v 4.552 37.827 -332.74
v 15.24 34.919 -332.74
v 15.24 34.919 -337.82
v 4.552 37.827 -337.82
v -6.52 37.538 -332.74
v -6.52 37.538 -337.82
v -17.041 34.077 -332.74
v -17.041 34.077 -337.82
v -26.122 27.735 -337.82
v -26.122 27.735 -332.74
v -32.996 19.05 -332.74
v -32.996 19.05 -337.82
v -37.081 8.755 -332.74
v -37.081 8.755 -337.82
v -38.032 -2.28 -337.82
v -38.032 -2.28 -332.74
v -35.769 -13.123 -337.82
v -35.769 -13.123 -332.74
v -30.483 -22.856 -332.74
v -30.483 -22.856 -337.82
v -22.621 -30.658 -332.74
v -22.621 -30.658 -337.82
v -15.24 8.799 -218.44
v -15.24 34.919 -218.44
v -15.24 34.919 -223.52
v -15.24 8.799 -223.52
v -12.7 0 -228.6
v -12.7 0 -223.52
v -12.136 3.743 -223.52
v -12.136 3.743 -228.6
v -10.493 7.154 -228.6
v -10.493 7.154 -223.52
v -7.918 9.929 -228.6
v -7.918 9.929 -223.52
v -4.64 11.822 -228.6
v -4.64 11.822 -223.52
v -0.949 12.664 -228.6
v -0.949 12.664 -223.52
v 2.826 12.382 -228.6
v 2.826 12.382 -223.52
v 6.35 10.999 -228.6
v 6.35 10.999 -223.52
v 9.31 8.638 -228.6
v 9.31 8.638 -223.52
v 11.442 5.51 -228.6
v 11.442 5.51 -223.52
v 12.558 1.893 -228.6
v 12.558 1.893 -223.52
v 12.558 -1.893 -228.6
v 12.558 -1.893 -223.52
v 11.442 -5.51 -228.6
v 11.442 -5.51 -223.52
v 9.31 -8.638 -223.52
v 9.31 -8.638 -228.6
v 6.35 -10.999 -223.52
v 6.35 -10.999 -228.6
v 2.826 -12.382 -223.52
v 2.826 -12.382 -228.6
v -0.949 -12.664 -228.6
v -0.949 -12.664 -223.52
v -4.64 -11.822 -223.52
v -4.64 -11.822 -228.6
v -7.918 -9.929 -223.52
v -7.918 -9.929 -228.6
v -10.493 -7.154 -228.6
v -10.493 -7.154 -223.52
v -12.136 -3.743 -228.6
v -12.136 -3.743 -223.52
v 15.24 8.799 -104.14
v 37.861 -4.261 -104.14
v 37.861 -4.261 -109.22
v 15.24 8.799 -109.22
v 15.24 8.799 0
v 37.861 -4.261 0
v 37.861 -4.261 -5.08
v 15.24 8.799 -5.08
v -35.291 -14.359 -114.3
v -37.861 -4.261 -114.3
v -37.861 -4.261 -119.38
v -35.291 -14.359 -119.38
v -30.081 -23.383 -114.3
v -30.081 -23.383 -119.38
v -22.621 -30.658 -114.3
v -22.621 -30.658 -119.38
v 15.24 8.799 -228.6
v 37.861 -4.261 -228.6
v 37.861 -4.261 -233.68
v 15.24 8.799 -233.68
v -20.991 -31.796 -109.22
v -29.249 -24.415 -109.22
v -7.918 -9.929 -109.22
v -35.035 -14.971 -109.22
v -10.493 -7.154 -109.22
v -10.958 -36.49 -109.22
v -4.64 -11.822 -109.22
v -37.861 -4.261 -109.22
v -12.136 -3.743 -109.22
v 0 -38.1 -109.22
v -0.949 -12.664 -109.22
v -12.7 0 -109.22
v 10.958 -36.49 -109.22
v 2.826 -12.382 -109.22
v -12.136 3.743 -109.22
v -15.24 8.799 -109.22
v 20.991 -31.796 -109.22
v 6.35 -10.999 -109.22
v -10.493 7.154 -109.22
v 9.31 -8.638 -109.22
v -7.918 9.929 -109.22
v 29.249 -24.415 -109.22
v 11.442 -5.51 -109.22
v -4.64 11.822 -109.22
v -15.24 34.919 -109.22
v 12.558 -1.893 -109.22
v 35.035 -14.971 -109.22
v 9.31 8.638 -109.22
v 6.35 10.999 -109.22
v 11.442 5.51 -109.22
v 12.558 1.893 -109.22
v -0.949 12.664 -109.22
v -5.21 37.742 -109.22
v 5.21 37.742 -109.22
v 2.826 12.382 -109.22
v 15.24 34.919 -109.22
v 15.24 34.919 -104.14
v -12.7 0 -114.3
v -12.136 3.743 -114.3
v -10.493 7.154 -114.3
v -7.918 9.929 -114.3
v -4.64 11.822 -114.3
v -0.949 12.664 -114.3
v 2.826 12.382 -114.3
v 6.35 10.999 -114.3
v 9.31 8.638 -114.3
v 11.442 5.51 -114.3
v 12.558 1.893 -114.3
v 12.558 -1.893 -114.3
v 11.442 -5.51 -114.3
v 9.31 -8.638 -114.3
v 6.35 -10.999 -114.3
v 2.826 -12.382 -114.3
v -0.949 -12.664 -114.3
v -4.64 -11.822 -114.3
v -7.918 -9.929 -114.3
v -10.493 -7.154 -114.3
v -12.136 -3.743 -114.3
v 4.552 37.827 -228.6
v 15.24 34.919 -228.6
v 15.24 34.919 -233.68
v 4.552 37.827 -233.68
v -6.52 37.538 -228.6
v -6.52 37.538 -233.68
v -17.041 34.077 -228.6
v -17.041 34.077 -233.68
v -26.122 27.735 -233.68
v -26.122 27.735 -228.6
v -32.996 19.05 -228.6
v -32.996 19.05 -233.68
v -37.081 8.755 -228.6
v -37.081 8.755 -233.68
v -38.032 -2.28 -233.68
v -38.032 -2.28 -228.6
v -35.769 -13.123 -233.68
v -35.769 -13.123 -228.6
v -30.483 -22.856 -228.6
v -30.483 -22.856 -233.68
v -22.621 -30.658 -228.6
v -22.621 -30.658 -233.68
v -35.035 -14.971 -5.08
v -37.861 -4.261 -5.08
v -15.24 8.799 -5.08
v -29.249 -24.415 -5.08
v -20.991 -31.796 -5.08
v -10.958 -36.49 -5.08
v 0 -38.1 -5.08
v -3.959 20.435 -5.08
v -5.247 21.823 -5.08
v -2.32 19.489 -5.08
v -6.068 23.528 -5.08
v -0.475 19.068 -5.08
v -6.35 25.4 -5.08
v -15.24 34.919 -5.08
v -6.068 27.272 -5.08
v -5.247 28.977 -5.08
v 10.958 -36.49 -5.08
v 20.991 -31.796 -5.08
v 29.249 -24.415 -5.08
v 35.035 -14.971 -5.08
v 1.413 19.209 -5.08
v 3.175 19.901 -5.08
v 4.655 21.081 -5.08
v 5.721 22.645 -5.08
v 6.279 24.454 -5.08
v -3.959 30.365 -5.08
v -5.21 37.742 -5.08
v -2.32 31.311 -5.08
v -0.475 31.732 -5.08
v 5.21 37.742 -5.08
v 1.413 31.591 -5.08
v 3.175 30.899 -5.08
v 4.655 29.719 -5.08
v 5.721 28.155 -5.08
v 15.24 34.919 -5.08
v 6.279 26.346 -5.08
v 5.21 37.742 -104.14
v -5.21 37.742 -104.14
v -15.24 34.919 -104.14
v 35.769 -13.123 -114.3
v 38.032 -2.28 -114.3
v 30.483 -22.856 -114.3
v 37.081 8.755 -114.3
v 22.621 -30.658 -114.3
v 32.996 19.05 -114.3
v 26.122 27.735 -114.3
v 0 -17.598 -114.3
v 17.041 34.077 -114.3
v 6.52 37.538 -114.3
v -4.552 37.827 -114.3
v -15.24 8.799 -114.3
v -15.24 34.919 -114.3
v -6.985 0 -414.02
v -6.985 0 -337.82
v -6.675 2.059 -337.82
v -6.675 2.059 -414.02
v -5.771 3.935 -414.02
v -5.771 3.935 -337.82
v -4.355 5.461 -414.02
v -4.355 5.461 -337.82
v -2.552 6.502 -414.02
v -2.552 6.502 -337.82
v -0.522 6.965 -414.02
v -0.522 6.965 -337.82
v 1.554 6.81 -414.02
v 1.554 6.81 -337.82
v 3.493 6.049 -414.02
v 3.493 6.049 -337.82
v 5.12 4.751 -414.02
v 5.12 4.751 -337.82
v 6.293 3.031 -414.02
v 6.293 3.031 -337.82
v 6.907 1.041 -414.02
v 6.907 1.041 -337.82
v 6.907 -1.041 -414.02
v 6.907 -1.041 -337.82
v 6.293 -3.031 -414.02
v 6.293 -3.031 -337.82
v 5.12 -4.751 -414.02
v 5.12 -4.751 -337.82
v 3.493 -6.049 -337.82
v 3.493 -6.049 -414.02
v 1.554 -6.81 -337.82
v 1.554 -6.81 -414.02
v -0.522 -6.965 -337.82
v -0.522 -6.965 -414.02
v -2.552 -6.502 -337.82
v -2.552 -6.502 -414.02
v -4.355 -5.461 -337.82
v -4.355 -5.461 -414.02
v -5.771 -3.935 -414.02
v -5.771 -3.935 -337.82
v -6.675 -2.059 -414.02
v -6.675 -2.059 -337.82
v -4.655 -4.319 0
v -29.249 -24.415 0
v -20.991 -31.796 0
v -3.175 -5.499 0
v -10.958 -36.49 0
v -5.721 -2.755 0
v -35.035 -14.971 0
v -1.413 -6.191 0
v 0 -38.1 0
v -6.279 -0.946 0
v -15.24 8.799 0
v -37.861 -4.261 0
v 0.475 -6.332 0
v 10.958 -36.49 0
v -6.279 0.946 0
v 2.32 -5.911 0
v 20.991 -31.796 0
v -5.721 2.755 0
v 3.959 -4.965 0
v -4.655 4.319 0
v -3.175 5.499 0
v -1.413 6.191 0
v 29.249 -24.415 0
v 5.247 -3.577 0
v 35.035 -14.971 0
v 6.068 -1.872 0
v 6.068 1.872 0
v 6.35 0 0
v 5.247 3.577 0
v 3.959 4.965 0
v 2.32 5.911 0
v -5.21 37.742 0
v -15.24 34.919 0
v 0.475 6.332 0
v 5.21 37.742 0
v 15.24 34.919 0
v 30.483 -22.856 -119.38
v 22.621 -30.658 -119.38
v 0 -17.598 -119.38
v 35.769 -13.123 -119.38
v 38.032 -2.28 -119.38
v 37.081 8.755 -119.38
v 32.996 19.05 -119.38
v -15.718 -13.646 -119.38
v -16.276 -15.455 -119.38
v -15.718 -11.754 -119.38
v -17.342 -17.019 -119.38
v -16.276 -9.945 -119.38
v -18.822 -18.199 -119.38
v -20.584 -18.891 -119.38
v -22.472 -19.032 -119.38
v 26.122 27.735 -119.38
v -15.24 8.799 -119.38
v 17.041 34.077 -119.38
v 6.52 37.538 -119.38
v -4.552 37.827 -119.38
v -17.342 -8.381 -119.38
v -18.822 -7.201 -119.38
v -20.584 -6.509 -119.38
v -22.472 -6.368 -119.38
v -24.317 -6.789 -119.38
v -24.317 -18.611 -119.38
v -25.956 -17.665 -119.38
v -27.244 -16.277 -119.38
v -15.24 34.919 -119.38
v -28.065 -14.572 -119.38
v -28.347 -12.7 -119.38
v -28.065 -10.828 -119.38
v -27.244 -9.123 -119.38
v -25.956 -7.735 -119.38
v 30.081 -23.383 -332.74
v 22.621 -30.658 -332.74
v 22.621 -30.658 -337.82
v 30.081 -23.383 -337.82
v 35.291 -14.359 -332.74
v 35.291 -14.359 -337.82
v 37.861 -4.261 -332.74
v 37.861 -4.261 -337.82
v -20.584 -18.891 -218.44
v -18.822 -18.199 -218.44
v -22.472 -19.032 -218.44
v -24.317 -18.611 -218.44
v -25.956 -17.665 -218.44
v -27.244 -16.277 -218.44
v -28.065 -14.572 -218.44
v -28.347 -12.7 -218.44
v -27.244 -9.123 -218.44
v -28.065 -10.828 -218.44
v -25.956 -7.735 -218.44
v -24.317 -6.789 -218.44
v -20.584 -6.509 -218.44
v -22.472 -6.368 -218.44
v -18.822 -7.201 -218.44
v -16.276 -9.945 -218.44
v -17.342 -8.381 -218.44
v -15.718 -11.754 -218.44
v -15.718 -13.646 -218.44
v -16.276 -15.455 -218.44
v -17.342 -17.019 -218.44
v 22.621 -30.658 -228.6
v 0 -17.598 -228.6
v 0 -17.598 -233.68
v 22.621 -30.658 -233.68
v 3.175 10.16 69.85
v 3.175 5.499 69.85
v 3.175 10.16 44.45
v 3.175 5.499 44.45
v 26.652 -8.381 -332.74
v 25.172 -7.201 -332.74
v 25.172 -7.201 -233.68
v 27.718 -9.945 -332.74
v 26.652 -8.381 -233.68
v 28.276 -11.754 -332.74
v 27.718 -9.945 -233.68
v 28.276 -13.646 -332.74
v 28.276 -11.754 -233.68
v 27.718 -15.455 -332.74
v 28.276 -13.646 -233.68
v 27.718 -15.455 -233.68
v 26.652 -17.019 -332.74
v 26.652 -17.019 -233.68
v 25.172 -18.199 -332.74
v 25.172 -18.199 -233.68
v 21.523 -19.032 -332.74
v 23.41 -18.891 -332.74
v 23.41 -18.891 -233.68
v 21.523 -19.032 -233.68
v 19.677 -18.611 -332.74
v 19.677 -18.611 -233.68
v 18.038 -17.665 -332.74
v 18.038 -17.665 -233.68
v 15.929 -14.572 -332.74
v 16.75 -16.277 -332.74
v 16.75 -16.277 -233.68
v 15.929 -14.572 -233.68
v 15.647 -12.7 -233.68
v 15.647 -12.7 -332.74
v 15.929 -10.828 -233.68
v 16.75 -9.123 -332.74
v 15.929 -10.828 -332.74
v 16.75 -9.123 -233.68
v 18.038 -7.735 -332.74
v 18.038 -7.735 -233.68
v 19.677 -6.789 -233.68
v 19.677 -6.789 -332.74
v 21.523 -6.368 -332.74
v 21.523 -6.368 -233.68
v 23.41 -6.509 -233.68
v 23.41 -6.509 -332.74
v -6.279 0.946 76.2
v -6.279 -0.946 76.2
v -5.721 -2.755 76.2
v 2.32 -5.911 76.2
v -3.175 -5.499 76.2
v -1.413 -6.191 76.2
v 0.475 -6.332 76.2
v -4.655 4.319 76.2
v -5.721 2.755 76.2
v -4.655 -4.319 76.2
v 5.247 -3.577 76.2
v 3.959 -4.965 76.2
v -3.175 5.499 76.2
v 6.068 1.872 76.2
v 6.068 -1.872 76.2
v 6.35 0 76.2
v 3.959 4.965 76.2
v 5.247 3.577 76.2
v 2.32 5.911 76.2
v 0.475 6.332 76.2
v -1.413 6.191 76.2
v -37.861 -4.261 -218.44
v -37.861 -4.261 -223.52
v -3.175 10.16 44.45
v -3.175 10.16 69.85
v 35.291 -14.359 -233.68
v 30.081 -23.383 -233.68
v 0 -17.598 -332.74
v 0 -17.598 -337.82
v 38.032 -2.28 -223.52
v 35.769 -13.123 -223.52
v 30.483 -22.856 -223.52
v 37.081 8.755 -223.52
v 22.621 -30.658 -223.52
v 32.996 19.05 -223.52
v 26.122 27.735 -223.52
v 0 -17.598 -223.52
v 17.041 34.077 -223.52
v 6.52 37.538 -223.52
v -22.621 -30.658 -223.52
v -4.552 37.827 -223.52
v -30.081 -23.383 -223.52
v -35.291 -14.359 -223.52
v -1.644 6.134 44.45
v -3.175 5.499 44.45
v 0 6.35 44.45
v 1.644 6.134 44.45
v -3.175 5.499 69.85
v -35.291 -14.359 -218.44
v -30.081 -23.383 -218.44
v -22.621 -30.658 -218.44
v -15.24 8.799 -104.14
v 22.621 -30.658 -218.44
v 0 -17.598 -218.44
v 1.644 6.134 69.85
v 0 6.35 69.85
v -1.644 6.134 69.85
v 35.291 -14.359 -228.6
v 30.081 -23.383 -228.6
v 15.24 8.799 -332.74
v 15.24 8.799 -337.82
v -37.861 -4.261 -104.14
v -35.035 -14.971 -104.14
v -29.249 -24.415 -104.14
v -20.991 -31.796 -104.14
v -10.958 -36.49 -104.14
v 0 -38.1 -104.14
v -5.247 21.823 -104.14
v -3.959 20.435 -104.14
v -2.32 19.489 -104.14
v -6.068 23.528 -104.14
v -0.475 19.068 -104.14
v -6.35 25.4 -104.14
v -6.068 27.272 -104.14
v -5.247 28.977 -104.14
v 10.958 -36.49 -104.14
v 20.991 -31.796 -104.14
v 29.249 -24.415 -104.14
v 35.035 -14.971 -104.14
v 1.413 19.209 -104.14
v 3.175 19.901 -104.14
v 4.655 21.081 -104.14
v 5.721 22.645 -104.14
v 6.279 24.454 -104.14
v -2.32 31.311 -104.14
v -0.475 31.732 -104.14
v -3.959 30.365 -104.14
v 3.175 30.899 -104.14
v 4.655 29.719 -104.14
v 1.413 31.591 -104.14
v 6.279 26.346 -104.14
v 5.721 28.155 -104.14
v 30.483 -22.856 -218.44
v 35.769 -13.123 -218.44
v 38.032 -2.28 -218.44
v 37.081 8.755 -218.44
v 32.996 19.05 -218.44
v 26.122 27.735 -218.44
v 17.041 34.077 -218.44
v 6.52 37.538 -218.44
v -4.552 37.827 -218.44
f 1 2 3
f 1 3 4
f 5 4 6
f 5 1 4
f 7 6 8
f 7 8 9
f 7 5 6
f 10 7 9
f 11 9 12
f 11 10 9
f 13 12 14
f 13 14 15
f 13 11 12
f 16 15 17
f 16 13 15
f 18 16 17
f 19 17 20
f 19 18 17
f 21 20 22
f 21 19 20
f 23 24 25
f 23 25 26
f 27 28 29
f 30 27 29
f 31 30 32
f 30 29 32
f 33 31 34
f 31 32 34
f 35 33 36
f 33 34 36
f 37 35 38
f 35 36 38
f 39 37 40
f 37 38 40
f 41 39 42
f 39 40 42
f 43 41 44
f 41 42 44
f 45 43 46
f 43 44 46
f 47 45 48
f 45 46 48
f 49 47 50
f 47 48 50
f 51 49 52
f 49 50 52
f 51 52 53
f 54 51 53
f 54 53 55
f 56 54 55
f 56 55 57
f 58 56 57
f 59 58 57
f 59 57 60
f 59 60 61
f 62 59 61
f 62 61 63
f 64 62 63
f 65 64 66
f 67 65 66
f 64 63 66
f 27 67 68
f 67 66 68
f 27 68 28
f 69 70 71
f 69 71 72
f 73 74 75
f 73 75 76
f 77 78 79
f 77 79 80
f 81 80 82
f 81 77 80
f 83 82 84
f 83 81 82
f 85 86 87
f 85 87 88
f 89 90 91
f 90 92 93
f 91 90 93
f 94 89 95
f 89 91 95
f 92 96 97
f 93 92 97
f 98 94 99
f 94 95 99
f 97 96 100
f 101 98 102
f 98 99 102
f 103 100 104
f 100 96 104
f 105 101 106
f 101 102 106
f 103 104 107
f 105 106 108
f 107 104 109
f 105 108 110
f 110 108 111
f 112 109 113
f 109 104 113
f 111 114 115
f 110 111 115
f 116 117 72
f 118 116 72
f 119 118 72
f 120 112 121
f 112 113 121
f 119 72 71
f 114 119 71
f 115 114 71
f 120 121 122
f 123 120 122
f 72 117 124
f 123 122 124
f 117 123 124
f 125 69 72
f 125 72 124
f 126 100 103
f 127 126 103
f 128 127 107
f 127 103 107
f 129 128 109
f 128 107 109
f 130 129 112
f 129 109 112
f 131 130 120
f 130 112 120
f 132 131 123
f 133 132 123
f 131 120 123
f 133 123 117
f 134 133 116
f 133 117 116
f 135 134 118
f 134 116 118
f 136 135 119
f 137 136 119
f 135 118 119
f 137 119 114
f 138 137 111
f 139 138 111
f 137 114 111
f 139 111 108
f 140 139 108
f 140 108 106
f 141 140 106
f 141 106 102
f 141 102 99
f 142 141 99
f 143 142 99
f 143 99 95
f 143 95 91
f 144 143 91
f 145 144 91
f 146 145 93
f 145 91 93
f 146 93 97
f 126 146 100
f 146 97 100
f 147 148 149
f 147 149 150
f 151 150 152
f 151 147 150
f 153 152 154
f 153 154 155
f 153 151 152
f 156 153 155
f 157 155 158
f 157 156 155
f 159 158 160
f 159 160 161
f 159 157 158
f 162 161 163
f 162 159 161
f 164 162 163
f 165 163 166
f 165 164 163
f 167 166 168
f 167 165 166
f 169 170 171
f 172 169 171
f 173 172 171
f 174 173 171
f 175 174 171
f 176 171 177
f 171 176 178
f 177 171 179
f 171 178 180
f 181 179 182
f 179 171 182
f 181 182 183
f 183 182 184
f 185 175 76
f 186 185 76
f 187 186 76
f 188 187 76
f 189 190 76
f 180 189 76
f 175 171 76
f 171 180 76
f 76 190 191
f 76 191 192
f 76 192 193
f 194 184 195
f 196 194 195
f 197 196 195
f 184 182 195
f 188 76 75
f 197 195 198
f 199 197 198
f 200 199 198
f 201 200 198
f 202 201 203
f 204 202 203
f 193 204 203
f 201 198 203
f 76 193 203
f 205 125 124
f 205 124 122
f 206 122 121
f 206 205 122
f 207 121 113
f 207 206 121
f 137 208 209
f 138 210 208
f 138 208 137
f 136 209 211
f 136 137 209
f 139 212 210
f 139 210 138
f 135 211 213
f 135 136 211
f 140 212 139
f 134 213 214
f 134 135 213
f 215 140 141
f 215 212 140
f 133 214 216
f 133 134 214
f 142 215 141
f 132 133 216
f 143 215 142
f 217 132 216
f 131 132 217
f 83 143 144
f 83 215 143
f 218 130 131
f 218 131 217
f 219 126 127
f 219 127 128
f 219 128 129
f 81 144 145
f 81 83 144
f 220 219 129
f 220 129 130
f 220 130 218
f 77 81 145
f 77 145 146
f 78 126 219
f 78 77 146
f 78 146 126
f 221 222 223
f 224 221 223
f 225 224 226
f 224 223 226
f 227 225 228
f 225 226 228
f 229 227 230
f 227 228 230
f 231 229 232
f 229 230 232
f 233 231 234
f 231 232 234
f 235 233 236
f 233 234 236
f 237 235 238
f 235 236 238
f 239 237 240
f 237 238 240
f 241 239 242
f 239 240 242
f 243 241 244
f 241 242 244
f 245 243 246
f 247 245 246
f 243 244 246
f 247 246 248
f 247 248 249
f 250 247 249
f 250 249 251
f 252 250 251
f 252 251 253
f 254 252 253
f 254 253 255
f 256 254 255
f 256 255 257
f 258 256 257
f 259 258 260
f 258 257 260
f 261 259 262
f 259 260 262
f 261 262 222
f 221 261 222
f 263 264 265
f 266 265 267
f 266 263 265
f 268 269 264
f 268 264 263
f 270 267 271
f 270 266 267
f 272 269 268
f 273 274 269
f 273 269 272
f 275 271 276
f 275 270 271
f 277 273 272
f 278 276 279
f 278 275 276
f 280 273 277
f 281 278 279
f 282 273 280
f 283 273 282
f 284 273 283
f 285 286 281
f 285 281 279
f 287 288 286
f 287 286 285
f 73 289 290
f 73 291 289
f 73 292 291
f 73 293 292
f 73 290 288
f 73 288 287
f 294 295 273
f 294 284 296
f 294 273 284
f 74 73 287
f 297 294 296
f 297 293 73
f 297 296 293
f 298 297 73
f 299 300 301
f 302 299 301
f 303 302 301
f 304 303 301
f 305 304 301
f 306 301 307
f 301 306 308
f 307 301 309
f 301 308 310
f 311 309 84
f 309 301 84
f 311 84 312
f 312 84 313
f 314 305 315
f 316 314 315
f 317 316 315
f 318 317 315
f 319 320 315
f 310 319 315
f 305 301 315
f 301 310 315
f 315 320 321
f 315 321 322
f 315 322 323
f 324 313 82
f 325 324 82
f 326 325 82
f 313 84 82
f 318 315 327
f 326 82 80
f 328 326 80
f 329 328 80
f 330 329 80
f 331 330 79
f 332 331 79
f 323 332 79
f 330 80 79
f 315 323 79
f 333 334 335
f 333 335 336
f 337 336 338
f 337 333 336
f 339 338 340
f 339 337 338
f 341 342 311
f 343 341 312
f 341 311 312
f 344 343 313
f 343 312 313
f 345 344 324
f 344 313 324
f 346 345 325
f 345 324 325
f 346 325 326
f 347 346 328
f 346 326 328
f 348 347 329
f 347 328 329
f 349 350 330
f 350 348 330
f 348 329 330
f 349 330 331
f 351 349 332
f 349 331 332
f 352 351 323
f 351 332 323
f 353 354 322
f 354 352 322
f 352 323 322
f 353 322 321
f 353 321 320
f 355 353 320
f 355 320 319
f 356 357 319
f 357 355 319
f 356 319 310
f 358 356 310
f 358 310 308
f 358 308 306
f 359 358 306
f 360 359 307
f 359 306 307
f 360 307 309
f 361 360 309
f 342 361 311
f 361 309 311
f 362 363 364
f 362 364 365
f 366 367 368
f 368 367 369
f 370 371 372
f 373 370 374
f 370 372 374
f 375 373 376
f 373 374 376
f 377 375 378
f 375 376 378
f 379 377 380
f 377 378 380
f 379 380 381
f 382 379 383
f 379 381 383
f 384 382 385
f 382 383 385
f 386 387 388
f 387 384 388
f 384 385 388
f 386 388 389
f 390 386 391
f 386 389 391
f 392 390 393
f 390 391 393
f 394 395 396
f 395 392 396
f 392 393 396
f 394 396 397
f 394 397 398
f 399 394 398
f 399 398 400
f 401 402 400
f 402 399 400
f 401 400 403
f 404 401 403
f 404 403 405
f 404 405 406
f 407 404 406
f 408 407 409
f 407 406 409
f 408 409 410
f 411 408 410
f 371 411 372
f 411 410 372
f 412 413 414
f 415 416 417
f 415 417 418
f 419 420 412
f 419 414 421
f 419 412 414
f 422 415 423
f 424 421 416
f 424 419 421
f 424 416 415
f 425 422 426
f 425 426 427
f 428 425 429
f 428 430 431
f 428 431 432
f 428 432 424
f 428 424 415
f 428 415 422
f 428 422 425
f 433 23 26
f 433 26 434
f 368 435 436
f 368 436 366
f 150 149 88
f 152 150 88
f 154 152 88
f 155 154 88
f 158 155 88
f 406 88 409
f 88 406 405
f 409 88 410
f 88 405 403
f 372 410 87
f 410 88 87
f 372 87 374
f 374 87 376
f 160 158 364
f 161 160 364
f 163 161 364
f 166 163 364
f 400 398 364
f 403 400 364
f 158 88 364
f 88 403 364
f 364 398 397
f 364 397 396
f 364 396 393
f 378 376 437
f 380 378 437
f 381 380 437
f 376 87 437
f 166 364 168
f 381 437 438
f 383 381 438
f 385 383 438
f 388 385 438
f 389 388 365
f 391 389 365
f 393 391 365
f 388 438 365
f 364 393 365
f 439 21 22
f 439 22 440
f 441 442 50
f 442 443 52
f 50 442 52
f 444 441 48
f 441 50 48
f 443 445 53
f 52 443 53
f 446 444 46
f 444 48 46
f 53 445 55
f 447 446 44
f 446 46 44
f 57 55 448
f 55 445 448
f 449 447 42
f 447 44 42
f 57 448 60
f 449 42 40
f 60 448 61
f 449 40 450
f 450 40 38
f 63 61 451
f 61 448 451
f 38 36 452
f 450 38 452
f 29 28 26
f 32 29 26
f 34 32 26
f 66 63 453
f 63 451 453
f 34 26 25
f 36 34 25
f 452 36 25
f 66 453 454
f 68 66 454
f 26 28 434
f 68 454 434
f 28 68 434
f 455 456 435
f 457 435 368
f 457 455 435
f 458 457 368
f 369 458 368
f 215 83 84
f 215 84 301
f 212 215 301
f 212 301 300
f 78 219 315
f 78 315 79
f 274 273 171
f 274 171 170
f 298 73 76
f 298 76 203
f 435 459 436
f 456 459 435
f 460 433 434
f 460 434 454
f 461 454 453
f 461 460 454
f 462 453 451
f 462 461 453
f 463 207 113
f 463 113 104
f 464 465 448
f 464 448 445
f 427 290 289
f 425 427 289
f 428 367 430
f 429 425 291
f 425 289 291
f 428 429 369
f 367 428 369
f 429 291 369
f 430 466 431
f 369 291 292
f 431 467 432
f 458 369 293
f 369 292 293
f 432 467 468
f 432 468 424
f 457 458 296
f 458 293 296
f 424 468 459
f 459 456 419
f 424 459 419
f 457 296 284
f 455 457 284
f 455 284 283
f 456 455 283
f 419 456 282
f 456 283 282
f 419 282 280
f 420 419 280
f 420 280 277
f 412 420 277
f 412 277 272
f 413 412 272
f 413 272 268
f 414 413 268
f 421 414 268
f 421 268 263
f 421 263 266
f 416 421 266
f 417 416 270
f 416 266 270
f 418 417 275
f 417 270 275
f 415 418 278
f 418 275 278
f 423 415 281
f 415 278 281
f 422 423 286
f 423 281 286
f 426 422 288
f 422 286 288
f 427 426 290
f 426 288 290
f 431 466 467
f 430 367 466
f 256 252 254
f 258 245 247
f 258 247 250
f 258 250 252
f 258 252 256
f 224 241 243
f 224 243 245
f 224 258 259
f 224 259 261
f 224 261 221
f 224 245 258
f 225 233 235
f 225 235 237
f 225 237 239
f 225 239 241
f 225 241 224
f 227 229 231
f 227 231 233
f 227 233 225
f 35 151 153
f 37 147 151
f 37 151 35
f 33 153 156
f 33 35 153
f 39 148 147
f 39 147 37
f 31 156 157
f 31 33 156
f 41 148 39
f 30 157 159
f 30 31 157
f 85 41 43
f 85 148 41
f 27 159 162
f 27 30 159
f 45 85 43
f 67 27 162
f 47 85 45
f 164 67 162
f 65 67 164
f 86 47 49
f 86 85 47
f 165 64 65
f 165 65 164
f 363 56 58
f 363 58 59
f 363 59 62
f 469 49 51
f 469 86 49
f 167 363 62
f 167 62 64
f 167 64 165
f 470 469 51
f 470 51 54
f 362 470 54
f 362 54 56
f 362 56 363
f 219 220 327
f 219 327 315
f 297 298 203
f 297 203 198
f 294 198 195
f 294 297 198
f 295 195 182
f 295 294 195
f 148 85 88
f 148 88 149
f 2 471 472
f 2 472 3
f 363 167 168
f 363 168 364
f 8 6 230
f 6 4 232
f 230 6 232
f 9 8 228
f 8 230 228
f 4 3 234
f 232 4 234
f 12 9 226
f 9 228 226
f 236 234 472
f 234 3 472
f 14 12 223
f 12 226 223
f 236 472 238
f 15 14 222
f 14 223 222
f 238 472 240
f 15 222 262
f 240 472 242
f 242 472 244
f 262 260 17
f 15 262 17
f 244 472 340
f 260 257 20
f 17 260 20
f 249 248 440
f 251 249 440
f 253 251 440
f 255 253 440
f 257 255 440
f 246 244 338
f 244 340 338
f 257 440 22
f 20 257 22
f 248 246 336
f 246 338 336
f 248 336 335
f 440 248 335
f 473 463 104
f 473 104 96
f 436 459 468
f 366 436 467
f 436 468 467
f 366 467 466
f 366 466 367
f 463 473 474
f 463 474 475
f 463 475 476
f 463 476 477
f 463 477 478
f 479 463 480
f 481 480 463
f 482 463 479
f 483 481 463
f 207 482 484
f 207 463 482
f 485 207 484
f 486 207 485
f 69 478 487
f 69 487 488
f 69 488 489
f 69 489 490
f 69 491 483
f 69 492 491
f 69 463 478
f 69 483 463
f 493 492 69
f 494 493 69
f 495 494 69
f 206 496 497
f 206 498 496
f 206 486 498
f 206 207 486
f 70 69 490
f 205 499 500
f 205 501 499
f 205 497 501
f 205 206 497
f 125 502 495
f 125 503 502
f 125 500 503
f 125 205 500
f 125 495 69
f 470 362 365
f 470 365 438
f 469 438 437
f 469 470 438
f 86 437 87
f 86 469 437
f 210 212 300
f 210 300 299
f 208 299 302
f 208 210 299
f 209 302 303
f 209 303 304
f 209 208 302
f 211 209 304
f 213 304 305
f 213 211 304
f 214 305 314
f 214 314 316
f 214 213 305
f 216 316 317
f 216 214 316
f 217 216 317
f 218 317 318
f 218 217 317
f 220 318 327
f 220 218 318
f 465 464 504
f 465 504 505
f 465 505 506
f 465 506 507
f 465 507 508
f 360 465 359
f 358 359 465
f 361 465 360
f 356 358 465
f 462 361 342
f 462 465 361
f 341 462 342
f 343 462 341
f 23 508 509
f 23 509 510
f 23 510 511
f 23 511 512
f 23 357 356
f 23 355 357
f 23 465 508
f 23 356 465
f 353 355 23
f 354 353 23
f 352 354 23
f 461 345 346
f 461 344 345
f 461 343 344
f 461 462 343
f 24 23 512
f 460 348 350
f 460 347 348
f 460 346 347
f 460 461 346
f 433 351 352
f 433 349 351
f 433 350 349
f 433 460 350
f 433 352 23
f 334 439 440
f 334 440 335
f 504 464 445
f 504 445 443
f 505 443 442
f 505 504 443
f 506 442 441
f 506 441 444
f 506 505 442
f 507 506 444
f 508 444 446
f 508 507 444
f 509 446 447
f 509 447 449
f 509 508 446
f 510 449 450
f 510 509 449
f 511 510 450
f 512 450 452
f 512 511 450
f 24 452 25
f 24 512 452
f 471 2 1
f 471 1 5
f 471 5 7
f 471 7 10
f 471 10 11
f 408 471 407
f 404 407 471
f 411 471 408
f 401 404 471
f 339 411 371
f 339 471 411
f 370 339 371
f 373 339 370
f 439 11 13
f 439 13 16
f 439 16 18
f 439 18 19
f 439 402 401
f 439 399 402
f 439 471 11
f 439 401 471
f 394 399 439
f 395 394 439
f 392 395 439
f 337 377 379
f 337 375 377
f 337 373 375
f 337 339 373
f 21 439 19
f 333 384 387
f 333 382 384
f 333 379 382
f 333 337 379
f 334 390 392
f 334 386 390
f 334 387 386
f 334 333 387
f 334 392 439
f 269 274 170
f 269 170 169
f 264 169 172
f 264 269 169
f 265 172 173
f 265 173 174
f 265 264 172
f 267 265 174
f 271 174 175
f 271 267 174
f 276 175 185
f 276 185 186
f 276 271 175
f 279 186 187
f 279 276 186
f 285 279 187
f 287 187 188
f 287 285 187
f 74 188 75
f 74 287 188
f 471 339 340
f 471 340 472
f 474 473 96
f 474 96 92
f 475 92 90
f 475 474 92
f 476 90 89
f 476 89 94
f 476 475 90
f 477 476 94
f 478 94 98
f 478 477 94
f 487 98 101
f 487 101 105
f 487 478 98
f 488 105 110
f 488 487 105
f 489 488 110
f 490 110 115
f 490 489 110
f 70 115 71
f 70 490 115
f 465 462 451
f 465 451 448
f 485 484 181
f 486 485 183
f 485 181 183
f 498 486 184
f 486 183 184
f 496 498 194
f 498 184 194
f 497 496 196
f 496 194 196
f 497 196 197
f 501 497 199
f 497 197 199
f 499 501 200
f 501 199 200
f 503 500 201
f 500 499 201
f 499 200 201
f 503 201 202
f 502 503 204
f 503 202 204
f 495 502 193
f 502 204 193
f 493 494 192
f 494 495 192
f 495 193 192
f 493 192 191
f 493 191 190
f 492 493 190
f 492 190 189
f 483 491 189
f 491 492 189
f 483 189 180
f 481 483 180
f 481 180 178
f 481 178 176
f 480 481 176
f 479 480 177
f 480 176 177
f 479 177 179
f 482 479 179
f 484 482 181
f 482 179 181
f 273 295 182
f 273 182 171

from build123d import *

# Parameters (mm, degrees)
BOSS_EXTRUDE1_DEPTH   = 5.08
LPATTERN1_COUNT       = 2
LPATTERN1_PITCH       = 104.14
SKETCH2_R             = 6.35
BOSS_EXTRUDE2_DEPTH   = 104.14
LPATTERN2_COUNT       = 3
LPATTERN2_PITCH       = 114.3
BODY_MOVE_COPY1_ANGLE = 120
BODY_MOVE_COPY2_ANGLE = 120
SKETCH3_R             = 12.7
BOSS_EXTRUDE3_DEPTH   = 5.08
BOSS_EXTRUDE4_START   = 114.3
SKETCH3_2_R           = 12.7
BOSS_EXTRUDE4_DEPTH   = 5.08
SKETCH4_R             = 6.985
BOSS_EXTRUDE5_DEPTH   = 76.2
SKETCH5_R             = 6.35
BOSS_EXTRUDE6_DEPTH   = 76.2
BOSS_EXTRUDE7_START   = 5.499261
SKETCH6_W             = 6.35
SKETCH6_H             = 25.4
BOSS_EXTRUDE7_DEPTH   = 4.660739


with BuildPart() as part:
    # Sketch1 → Boss-Extrude1 (new body)
    with BuildSketch(Plane.XY):
        with BuildLine():
            Line((15.24, 8.798818102), (15.24, 34.919226796))
            ThreePointArc((15.24, 34.919226796), (0, 38.1), (-15.24, 34.919226796))
            Line((-15.24, 34.919226796), (-15.24, 8.798818102))
            Line((-15.24, 8.798818102), (-37.860937485, -4.261386244))
            ThreePointArc((-37.860937485, -4.261386244), (0, -38.1), (37.860937485, -4.261386244))
            Line((37.860937485, -4.261386244), (15.24, 8.798818102))
        make_face()
    extrude(amount=-BOSS_EXTRUDE1_DEPTH)


with BuildPart() as lpattern1_1:
    # LPattern1: pattern copy
    add(part.part.moved(Location(Vector(0, 0, -1) * (1 * LPATTERN1_PITCH))))


with BuildPart() as part_1:
    add(part.part)

    add(lpattern1_1.part)  # Boss-Extrude2 merges LPattern1_1
    # Sketch2 → Boss-Extrude2 (add)
    with BuildSketch(Plane(origin=(0, 0, -5.08), x_dir=(-1, 0, 0), z_dir=(0, 0, -1))):
        with Locations((0, 25.4)):
            Circle(SKETCH2_R)
    extrude(amount=BOSS_EXTRUDE2_DEPTH)


with BuildPart() as lpattern2_1:
    # LPattern2: pattern copy
    add(part_1.part.moved(Location(Vector(0, 0, -1) * (1 * LPATTERN2_PITCH))))


with BuildPart() as lpattern2_2:
    # LPattern2: pattern copy
    add(part_1.part.moved(Location(Vector(0, 0, -1) * (2 * LPATTERN2_PITCH))))


with BuildPart() as lpattern2_1_1:
    # Body-Move/Copy1: moved
    add(lpattern2_1.part.rotate(Axis((0, 0, 0), (0, 0, 1)), BODY_MOVE_COPY1_ANGLE))


with BuildPart() as lpattern2_2_1:
    # Body-Move/Copy2: moved
    add(lpattern2_2.part.rotate(Axis((0, 0, 0), (0, 0, -1)), BODY_MOVE_COPY2_ANGLE))


with BuildPart() as part_2:
    add(part_1.part)

    add(lpattern2_1_1.part)  # Boss-Extrude3 merges LPattern2_1
    # Sketch3 → Boss-Extrude3 (add)
    with BuildSketch(Plane(origin=(0, 0, -109.22), x_dir=(-1, 0, 0), z_dir=(0, 0, -1))):
        Circle(SKETCH3_R)
    extrude(amount=BOSS_EXTRUDE3_DEPTH)

    add(lpattern2_2_1.part)  # Boss-Extrude4 merges LPattern2_2
    # Sketch3<2> → Boss-Extrude4 (add)
    with BuildSketch(Plane(origin=(0, 0, -109.22), x_dir=(-1, 0, 0), z_dir=(0, 0, -1)).offset(BOSS_EXTRUDE4_START)):
        Circle(SKETCH3_2_R)
    extrude(amount=BOSS_EXTRUDE4_DEPTH)

    # Sketch4 → Boss-Extrude5 (add)
    with BuildSketch(Plane(origin=(0, 0, -337.82), x_dir=(-1, 0, 0), z_dir=(0, 0, -1))):
        Circle(SKETCH4_R)
    extrude(amount=BOSS_EXTRUDE5_DEPTH)

    # Sketch5 → Boss-Extrude6 (add)
    with BuildSketch(Plane.XY):
        Circle(SKETCH5_R)
    extrude(amount=BOSS_EXTRUDE6_DEPTH)

    # Sketch6 → Boss-Extrude7 (add)
    with BuildSketch(Plane(origin=(0, 0, 0), x_dir=(1, 0, 0), z_dir=(0, 1, 0)).offset(BOSS_EXTRUDE7_START)):
        with Locations((0, -57.15)):
            Rectangle(SKETCH6_W, SKETCH6_H)
    extrude(amount=BOSS_EXTRUDE7_DEPTH)


solid = part_2.part
